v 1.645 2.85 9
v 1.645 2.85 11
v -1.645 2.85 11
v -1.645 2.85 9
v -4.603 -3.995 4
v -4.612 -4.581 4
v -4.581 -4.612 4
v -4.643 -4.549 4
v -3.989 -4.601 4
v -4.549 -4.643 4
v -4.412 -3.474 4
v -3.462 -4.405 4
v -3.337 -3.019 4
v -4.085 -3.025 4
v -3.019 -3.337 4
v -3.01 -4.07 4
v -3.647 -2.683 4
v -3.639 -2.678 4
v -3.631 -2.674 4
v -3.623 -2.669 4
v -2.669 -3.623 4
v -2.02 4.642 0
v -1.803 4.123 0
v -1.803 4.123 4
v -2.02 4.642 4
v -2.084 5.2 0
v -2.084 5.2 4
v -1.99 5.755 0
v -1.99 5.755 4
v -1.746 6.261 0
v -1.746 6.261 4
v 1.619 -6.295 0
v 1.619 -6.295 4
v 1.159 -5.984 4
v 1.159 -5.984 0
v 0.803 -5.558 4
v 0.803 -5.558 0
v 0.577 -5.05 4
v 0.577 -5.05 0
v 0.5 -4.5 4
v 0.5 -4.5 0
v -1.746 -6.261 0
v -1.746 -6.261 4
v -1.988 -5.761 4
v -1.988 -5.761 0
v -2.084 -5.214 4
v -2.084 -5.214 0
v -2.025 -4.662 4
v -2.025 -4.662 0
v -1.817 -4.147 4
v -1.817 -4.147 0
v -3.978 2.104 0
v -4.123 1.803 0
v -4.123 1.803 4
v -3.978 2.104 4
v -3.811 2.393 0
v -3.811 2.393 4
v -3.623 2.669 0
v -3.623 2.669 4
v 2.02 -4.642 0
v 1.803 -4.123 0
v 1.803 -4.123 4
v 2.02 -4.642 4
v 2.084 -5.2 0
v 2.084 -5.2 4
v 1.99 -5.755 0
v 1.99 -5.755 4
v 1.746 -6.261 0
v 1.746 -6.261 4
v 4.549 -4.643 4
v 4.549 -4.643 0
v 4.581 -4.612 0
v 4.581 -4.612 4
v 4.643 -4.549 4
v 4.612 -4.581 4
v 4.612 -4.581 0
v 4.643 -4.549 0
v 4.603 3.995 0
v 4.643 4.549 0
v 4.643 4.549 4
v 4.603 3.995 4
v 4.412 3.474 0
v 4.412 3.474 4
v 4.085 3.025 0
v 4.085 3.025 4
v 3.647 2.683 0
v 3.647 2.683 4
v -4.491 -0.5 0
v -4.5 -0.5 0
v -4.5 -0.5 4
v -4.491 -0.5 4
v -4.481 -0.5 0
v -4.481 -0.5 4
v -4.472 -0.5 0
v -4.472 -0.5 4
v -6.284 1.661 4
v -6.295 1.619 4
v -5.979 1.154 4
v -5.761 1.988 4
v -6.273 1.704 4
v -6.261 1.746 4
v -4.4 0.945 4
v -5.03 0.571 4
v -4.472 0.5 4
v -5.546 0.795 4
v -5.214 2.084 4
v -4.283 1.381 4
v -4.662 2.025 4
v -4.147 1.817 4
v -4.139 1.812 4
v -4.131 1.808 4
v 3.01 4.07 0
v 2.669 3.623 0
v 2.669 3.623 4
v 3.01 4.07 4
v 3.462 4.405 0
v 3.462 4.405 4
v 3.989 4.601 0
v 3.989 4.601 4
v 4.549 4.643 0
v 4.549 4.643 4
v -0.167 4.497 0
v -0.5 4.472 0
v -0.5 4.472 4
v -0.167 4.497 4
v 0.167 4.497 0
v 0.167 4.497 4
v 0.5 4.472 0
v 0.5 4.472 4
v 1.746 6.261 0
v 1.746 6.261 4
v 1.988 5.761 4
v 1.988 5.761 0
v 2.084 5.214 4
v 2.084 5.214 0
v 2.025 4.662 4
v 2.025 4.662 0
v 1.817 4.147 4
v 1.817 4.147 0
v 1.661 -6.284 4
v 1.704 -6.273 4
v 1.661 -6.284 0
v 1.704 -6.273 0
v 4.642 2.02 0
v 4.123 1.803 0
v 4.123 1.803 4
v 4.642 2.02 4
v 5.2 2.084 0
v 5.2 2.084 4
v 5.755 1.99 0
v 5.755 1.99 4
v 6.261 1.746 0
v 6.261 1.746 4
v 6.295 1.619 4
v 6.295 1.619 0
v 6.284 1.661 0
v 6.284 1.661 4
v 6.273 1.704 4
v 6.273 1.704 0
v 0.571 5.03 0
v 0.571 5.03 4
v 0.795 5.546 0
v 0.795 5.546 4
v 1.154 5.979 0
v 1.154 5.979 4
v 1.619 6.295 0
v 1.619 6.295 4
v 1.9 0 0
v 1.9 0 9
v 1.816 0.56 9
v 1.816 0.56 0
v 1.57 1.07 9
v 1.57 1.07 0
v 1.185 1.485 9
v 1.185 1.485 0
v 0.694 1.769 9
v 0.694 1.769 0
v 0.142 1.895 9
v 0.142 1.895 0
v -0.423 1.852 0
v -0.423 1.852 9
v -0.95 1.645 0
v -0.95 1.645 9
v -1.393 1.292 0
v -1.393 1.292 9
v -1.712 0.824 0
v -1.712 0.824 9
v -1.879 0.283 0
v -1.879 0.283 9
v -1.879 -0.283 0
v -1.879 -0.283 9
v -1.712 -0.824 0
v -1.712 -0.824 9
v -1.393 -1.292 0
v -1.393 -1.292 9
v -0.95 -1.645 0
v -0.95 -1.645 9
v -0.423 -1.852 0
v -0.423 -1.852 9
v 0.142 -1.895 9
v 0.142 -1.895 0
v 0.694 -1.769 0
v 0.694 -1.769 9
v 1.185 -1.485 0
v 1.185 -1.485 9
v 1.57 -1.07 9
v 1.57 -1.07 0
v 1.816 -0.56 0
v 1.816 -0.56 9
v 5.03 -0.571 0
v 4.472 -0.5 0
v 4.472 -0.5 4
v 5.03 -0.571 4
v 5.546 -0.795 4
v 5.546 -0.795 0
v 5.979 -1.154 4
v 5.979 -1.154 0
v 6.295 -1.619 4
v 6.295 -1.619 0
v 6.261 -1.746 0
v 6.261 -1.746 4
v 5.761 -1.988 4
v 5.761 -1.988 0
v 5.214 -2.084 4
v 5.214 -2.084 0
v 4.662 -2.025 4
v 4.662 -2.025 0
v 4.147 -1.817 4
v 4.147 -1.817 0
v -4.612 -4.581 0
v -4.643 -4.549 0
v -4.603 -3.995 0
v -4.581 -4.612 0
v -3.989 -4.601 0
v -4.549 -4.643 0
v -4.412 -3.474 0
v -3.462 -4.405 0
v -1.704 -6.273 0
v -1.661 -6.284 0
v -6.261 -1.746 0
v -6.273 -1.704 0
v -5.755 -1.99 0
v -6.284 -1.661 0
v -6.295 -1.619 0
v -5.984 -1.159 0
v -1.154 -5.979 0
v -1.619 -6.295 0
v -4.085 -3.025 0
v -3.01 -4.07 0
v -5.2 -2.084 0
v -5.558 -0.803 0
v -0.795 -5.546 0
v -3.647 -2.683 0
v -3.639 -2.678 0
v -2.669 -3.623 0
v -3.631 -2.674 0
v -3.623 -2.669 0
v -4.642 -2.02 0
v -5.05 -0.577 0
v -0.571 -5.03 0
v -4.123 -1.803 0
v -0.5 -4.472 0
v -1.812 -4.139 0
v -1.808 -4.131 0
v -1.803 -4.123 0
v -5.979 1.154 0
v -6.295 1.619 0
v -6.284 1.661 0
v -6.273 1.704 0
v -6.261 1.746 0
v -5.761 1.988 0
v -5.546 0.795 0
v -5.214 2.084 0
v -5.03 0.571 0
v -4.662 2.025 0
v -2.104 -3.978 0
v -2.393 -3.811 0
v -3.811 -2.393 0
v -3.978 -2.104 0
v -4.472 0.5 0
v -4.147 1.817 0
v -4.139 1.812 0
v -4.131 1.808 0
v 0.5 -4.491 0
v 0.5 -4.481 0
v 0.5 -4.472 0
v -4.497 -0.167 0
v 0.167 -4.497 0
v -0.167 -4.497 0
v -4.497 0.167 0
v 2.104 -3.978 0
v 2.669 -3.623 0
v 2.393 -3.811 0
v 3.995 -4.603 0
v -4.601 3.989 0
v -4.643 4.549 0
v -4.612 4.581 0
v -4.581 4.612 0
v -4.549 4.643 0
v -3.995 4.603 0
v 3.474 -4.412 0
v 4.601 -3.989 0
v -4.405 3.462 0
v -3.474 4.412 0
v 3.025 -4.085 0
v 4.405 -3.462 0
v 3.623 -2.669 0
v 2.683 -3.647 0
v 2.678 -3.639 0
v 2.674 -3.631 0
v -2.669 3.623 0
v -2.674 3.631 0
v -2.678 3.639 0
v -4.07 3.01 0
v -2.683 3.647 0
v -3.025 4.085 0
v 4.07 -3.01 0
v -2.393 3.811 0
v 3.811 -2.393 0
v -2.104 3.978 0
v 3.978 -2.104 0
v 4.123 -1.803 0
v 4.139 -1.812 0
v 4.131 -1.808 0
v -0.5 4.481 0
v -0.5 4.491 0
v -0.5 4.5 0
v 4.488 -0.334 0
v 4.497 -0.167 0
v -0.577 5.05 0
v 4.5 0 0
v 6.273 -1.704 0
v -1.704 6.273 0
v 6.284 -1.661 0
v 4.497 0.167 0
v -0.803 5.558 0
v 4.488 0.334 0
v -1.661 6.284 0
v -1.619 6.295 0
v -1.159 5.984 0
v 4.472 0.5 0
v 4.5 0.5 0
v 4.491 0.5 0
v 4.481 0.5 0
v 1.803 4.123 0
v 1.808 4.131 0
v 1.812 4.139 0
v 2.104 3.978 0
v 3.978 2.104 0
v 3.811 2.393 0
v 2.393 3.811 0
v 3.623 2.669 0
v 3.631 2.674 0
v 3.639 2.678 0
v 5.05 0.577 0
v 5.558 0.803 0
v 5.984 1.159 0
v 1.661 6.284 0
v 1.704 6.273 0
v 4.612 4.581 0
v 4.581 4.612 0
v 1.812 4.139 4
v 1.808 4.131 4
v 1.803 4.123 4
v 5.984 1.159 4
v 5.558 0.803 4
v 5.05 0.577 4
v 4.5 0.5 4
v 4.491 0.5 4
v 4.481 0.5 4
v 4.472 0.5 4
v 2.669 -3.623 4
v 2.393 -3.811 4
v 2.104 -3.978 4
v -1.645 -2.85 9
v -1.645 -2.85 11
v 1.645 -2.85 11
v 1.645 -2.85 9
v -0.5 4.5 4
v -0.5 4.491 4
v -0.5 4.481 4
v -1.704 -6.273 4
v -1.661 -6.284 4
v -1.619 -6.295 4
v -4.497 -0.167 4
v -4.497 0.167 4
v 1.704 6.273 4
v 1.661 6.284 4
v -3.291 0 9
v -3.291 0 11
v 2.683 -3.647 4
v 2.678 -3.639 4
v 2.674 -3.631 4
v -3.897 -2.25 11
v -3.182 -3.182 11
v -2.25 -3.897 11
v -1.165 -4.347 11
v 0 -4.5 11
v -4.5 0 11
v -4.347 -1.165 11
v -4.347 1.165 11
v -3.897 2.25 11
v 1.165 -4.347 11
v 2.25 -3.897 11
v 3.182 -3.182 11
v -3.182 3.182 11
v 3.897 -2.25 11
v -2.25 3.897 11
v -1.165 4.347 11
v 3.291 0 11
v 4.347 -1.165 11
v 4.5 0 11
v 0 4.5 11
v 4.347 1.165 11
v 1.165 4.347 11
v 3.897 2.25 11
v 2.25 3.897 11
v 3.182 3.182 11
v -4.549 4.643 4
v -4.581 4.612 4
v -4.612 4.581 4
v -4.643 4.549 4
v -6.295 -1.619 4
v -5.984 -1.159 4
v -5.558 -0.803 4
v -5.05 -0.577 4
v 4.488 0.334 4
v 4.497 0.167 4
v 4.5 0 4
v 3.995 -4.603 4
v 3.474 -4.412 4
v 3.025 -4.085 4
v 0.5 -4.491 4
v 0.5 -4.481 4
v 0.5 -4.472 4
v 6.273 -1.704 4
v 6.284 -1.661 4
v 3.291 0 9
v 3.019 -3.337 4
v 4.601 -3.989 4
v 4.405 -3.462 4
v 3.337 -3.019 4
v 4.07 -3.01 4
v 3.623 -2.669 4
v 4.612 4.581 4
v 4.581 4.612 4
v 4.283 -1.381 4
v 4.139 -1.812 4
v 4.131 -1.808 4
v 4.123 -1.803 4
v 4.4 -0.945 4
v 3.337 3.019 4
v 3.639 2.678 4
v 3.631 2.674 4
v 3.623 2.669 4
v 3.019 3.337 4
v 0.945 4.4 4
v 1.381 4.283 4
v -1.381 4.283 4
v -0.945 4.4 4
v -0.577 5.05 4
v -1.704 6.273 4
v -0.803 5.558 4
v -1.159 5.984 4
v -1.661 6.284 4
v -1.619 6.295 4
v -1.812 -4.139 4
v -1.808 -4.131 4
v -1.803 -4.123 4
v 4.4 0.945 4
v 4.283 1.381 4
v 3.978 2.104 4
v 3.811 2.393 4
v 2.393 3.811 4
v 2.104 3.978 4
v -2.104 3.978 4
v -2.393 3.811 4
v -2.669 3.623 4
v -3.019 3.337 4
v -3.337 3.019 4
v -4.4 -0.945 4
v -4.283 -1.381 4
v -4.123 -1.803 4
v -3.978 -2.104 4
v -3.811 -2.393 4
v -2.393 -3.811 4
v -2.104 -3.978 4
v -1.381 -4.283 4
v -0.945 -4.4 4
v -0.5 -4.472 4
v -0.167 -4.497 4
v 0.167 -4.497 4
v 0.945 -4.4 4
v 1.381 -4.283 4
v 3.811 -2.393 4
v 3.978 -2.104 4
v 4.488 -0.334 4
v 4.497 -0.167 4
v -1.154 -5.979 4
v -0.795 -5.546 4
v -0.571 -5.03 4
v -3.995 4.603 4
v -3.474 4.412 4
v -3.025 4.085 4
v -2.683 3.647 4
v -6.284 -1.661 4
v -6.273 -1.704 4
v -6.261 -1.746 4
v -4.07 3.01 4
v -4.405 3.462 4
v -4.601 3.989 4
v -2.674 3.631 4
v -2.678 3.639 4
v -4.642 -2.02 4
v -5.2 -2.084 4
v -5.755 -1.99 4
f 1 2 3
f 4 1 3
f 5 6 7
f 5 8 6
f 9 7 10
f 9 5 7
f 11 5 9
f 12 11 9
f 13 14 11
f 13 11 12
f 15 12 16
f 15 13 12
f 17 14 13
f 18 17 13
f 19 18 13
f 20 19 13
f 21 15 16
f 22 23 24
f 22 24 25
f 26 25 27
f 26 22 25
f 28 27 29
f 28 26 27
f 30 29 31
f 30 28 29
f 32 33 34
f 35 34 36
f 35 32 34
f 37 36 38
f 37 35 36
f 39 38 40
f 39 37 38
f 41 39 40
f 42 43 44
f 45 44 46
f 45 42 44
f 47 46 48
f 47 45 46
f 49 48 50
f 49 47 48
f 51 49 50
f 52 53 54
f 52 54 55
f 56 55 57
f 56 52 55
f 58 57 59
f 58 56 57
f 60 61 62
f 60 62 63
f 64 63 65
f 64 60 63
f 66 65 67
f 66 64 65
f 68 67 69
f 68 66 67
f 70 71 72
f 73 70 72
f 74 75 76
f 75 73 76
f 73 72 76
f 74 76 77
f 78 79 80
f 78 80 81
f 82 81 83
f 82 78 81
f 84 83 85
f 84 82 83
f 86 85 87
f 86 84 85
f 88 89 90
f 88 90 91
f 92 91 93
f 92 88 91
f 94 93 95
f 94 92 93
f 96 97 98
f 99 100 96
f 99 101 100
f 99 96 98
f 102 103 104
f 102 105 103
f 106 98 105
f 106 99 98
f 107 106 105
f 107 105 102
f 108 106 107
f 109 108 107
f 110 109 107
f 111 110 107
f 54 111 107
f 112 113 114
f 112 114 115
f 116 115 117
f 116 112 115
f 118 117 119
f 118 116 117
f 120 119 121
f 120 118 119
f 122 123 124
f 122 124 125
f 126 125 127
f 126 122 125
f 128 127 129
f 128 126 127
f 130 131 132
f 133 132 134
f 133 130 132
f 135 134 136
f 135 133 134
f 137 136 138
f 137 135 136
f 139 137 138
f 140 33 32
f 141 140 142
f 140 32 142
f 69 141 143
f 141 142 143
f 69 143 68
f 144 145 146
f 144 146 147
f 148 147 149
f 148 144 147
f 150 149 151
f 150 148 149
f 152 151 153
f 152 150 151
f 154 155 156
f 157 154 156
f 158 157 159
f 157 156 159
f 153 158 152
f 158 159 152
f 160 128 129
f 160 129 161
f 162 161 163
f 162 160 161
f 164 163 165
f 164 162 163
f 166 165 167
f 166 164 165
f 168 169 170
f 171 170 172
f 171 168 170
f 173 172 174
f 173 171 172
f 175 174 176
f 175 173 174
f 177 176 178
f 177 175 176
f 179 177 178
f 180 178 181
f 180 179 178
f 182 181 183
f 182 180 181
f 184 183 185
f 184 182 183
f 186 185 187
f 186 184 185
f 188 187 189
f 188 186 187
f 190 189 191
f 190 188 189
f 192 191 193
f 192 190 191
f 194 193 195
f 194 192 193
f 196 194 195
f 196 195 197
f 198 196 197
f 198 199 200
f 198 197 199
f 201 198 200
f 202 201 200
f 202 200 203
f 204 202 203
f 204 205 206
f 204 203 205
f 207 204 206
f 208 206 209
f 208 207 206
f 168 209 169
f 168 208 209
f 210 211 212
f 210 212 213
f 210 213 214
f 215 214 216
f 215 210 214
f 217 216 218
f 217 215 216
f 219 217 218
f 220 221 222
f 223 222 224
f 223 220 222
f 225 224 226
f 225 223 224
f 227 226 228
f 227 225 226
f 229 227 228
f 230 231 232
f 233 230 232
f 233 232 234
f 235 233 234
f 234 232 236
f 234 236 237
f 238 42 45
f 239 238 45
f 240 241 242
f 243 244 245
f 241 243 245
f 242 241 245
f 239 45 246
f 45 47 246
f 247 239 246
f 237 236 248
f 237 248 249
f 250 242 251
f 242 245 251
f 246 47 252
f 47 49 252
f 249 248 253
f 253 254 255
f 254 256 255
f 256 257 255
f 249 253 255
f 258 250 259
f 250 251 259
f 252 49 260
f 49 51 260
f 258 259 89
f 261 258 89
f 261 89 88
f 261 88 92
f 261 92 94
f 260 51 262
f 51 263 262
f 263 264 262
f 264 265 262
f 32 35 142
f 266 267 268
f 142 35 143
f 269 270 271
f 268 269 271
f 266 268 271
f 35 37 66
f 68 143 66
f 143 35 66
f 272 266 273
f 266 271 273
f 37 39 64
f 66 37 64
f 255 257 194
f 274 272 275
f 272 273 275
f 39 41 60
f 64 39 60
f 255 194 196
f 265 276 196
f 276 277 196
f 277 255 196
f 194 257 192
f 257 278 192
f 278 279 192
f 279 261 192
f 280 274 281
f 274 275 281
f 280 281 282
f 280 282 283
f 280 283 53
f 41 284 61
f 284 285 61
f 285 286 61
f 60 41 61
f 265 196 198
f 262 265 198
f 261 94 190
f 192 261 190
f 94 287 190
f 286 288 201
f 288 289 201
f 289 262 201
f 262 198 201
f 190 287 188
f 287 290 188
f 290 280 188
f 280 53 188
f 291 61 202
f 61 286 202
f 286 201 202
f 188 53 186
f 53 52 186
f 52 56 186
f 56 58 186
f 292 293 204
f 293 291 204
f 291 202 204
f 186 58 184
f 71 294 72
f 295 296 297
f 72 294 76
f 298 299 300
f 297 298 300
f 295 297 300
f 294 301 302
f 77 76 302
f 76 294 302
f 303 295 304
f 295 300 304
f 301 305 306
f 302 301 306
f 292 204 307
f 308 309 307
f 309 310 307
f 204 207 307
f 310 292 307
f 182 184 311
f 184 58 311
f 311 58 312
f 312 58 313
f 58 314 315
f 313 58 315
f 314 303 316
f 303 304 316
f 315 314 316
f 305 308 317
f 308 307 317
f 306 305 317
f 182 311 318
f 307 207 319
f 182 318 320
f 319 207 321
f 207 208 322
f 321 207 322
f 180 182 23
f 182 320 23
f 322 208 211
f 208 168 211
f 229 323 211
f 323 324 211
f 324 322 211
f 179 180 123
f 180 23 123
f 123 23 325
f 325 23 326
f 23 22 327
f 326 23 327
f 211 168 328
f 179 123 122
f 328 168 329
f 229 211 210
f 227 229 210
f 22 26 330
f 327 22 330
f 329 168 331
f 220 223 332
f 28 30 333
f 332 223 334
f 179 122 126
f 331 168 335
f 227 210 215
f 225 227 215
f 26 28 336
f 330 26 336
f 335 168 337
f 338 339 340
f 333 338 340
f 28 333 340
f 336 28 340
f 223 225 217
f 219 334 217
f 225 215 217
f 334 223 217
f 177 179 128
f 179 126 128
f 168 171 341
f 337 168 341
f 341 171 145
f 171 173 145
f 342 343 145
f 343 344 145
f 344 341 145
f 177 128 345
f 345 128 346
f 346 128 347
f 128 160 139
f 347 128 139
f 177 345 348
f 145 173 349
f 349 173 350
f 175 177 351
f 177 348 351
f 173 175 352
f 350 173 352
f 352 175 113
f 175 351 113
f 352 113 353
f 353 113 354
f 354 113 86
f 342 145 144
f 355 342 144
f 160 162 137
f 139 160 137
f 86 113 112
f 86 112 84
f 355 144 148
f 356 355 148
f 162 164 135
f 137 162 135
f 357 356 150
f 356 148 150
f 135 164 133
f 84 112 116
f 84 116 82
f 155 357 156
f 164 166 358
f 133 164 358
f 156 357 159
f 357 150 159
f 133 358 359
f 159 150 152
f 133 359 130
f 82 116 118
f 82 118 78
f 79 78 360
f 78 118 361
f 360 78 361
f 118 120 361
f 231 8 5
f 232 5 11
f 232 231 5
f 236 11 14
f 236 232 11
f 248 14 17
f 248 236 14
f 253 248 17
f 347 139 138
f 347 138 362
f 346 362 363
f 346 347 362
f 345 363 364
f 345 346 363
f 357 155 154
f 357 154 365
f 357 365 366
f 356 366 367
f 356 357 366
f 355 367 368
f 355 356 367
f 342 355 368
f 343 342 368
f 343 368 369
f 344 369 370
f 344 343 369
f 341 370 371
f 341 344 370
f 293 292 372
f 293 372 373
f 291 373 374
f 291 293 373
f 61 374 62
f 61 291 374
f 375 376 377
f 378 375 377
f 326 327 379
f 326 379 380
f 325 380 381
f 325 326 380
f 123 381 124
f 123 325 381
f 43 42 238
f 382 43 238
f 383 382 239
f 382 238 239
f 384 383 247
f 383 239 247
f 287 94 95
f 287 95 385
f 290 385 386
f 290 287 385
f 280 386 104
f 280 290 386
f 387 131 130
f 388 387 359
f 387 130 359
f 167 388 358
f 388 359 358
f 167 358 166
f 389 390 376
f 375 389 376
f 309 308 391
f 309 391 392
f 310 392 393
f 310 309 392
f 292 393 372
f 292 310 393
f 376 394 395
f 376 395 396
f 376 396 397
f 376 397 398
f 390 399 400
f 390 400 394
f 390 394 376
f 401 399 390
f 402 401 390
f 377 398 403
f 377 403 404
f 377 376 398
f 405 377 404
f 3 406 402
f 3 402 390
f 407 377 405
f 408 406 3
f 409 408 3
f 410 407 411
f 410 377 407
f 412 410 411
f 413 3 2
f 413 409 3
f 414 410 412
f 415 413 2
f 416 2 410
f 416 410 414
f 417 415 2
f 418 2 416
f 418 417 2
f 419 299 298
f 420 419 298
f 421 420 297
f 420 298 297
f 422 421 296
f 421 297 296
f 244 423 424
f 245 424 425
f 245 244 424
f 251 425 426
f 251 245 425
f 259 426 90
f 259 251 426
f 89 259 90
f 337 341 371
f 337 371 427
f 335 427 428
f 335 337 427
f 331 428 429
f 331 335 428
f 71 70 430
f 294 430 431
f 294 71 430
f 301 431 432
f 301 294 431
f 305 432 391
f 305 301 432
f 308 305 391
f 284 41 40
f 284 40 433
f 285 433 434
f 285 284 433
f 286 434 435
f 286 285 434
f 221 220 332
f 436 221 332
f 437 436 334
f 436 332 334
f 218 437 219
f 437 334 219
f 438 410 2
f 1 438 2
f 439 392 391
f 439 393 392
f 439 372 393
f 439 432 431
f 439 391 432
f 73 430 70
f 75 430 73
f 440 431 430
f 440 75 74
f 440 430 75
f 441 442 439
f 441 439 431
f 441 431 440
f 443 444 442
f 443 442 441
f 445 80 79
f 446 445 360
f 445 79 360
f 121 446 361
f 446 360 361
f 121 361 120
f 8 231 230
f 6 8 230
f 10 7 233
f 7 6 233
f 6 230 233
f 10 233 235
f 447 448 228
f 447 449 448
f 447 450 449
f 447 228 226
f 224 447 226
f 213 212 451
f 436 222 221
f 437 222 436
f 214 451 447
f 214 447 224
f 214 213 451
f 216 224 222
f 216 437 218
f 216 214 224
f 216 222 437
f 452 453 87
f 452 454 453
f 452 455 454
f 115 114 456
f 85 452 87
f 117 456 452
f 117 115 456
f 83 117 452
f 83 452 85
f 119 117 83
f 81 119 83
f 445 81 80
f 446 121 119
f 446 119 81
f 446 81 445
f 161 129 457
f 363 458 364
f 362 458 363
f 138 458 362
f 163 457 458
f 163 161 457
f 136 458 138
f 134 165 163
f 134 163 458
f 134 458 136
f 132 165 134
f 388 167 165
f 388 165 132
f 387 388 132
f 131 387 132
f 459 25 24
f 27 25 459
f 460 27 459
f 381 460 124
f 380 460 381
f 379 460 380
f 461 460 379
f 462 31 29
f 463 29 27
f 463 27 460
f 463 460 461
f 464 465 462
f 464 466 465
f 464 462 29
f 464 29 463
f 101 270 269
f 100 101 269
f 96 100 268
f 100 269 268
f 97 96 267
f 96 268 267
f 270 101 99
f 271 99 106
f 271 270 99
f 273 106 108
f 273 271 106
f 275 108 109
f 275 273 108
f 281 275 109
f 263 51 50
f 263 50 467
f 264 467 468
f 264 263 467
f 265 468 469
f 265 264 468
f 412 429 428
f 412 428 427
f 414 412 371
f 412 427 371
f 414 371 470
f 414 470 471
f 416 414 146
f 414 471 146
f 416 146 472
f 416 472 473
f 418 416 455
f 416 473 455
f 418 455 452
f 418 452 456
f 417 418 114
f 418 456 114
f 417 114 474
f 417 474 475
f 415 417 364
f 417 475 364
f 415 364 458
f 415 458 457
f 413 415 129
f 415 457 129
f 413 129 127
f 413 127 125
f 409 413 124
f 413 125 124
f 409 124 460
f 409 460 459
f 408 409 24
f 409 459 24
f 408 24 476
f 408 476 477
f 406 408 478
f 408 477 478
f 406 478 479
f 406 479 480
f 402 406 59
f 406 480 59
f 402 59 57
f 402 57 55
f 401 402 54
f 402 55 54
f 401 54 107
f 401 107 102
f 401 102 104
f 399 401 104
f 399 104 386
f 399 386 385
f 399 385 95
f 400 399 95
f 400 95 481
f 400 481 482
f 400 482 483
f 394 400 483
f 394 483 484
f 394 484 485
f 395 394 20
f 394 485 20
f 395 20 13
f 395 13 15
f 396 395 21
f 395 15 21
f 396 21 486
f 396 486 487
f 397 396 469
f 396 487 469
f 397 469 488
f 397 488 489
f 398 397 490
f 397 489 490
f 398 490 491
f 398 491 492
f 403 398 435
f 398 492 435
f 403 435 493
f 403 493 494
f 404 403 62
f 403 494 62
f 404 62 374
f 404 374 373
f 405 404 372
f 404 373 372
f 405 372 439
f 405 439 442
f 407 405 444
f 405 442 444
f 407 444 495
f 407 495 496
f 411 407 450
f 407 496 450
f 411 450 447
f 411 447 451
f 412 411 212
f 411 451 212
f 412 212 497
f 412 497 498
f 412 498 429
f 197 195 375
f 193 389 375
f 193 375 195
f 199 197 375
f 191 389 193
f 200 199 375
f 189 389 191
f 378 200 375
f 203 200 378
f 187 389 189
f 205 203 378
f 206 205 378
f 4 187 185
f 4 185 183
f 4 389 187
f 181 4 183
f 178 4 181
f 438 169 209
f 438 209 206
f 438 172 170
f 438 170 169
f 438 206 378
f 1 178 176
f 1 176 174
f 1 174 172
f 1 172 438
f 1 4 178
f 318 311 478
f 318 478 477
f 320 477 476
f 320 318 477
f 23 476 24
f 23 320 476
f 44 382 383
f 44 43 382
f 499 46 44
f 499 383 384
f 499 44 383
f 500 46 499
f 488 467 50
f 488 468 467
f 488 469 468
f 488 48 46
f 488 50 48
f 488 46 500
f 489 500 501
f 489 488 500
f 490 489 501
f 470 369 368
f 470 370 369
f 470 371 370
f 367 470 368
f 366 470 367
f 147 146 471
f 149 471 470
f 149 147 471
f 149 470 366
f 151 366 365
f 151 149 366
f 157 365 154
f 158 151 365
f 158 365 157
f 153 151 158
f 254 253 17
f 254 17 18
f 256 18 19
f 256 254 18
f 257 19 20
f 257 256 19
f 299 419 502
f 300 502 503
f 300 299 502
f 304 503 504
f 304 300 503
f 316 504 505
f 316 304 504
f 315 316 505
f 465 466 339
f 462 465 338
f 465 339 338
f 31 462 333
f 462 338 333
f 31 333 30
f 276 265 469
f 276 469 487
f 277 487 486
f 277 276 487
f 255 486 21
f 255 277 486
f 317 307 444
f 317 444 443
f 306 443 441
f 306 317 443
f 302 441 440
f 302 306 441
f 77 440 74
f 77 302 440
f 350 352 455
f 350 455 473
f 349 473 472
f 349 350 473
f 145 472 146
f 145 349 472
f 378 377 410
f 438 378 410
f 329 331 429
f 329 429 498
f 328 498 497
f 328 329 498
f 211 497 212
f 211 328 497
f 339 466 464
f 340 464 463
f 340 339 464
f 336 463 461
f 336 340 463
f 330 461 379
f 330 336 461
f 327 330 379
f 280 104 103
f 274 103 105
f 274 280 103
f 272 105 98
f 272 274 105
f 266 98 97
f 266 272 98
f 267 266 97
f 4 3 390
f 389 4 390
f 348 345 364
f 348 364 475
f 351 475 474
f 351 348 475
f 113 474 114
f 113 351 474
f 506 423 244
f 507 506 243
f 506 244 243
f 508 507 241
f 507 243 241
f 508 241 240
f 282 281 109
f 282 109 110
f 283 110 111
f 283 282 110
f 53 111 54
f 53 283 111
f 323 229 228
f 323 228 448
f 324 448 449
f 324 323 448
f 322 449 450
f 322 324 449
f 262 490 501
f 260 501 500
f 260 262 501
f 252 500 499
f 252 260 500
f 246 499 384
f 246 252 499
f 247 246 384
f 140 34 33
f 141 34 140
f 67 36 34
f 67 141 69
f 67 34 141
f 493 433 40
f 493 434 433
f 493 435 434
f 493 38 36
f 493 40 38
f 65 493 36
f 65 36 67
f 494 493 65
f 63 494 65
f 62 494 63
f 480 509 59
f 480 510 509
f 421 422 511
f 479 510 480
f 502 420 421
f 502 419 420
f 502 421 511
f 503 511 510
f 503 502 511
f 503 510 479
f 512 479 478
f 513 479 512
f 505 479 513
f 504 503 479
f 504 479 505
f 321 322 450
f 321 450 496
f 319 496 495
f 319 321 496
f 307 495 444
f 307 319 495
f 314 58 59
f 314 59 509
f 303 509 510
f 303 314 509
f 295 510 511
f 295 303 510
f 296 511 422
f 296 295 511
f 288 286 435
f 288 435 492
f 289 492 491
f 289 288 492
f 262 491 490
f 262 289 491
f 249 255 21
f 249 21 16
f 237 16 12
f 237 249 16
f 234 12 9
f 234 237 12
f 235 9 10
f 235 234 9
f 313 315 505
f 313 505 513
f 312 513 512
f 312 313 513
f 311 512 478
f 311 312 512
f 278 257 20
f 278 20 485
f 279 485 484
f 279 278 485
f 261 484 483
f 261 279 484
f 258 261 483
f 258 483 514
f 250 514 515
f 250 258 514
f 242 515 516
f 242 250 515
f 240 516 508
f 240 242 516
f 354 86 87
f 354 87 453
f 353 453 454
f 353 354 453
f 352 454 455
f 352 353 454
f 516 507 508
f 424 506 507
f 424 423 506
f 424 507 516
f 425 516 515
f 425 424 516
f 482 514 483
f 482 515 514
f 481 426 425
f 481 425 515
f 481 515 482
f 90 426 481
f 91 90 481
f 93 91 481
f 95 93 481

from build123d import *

# Parameters (mm, degrees)
SKETCH1_R           = 6.5
SKETCH1_R_2         = 1
BOSS_EXTRUDE1_DEPTH = 4
CUT_EXTRUDE2_DEPTH  = 11.024968828
CIRPATTERN2_COUNT   = 12
SKETCH11_R          = 4.5
BOSS_EXTRUDE2_DEPTH = 11
CUT_EXTRUDE3_START  = 11
CUT_EXTRUDE3_DEPTH  = 2
SKETCH13_R          = 1.9
CUT_EXTRUDE4_DEPTH  = 15.151353444


with BuildPart() as part:
    # Sketch1 → Boss-Extrude1 (new body)
    with BuildSketch(Plane.XY):
        Circle(SKETCH1_R)
        Circle(SKETCH1_R_2, mode=Mode.SUBTRACT)
    extrude(amount=BOSS_EXTRUDE1_DEPTH)

    # Sketch4 → Cut-Extrude2 (cut, through all)
    with BuildSketch(Plane.XY):
        with BuildLine():
            ThreePointArc((-0.500194414, 4.472114215), (0, 4.5), (0.500194414, 4.472114215))
            ThreePointArc((0.500194414, 4.472114215), (1.113314535, 5.941215952), (2.604960982, 6.497243899))
            ThreePointArc((2.604960982, 6.497243899), (0, 7), (-2.604960982, 6.497243899))
            ThreePointArc((-2.604960982, 6.497243899), (-1.123395838, 5.950848366), (-0.5, 4.5))
            ThreePointArc((-0.5, 4.5), (-0.500048604, 4.486056768), (-0.500194414, 4.472114215))
        make_face()
    cut_extrude2 = extrude(amount=CUT_EXTRUDE2_DEPTH, mode=Mode.SUBTRACT)

    # CirPattern2: Cut-Extrude2 ×12 about axis
    cirpattern2_axis = Axis((0, 0, 4), (0, 0, -1))
    for i in range(1, CIRPATTERN2_COUNT):
        add(cut_extrude2.rotate(cirpattern2_axis, i * 360 / CIRPATTERN2_COUNT), mode=Mode.SUBTRACT)

    # Sketch11 → Boss-Extrude2 (add)
    with BuildSketch(Plane.XY):
        Circle(SKETCH11_R)
    extrude(amount=BOSS_EXTRUDE2_DEPTH)

    # Sketch12 → Cut-Extrude3 (cut)
    with BuildSketch(Plane.XY.offset(CUT_EXTRUDE3_START)):
        Polygon((3.290896534, 0), (1.645448267, 2.85), (-1.645448267, 2.85), (-3.290896534, 0), (-1.645448267, -2.85), (1.645448267, -2.85), align=None)
    extrude(amount=-CUT_EXTRUDE3_DEPTH, mode=Mode.SUBTRACT)

    # Sketch13 → Cut-Extrude4 (cut, through all)
    with BuildSketch(Plane.XY):
        Circle(SKETCH13_R)
    extrude(amount=CUT_EXTRUDE4_DEPTH, mode=Mode.SUBTRACT)


solid = part.part
